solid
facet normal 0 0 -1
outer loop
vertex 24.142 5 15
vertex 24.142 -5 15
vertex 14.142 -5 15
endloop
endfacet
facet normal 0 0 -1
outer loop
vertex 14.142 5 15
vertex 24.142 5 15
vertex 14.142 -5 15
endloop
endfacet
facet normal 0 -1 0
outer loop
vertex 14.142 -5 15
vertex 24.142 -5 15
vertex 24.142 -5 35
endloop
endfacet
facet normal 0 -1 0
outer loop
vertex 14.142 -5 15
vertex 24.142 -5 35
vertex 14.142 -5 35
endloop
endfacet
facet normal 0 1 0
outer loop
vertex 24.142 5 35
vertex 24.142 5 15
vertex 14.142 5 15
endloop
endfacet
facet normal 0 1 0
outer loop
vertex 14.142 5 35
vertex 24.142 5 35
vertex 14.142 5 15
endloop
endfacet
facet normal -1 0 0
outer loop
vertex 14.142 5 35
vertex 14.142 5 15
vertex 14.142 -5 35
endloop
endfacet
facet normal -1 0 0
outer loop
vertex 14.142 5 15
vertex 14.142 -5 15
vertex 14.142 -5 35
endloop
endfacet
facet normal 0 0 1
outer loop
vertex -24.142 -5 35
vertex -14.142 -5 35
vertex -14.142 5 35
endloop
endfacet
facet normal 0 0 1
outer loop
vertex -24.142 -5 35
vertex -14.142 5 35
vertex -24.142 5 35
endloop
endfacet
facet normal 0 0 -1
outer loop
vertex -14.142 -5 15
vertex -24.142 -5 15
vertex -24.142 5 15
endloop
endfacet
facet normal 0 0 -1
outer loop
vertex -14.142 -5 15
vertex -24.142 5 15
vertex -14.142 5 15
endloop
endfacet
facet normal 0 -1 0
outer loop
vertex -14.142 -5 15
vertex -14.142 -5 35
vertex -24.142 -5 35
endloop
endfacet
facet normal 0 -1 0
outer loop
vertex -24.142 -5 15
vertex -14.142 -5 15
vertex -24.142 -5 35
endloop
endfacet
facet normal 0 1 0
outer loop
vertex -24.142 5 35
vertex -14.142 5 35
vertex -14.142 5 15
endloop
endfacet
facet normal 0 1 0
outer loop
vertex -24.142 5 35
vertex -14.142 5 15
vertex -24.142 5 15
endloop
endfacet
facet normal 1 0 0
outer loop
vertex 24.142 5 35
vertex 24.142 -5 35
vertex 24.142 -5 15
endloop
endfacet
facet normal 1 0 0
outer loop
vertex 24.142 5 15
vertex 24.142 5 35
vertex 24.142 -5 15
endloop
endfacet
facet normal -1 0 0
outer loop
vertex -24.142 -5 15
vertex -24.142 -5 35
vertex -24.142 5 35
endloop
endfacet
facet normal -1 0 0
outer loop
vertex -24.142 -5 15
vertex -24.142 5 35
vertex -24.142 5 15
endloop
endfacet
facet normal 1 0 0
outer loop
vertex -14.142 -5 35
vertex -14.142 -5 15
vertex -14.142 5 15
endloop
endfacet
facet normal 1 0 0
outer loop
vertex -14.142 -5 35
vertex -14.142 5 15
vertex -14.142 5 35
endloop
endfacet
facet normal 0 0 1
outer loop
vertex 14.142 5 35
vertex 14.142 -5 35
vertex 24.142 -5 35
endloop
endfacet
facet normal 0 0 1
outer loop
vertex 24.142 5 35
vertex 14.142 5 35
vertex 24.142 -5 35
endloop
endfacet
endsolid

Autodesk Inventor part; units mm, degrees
ref_plane "YZ Plane" through (0, 0, 0) normal (1, 0, 0) x (0, 1, 0)
ref_plane "XZ Plane" through (0, 0, 0) normal (0, 1, 0) x (-1, 0, 0)
ref_plane "XY Plane" through (0, 0, 0) normal (0, 0, 1) x (1, 0, 0)
sketch "Опоры" plane through (0, 0, 0) normal (0, 1, 0) x (-1, 0, 0)
  line L0 (-14.1422, 35) -> (-24.142, 35)
  line L1 (-24.142, 35) -> (-24.142, 15)
  line L2 (-24.142, 15) -> (-14.1422, 15)
  line L3 (-14.1422, 15) -> (-14.1422, 35)
  line L4 (14.1421, 35) -> (24.1422, 35)
  line L5 (24.1422, 35) -> (24.1422, 15)
  line L6 (24.1422, 15) -> (14.1421, 15)
  line L7 (14.1421, 15) -> (14.1421, 35)
  point P0 (0, 0)
extrude "Выдавливание8" add sketch "Опоры" along normal mid plane 10
properties part number "Опоры"
